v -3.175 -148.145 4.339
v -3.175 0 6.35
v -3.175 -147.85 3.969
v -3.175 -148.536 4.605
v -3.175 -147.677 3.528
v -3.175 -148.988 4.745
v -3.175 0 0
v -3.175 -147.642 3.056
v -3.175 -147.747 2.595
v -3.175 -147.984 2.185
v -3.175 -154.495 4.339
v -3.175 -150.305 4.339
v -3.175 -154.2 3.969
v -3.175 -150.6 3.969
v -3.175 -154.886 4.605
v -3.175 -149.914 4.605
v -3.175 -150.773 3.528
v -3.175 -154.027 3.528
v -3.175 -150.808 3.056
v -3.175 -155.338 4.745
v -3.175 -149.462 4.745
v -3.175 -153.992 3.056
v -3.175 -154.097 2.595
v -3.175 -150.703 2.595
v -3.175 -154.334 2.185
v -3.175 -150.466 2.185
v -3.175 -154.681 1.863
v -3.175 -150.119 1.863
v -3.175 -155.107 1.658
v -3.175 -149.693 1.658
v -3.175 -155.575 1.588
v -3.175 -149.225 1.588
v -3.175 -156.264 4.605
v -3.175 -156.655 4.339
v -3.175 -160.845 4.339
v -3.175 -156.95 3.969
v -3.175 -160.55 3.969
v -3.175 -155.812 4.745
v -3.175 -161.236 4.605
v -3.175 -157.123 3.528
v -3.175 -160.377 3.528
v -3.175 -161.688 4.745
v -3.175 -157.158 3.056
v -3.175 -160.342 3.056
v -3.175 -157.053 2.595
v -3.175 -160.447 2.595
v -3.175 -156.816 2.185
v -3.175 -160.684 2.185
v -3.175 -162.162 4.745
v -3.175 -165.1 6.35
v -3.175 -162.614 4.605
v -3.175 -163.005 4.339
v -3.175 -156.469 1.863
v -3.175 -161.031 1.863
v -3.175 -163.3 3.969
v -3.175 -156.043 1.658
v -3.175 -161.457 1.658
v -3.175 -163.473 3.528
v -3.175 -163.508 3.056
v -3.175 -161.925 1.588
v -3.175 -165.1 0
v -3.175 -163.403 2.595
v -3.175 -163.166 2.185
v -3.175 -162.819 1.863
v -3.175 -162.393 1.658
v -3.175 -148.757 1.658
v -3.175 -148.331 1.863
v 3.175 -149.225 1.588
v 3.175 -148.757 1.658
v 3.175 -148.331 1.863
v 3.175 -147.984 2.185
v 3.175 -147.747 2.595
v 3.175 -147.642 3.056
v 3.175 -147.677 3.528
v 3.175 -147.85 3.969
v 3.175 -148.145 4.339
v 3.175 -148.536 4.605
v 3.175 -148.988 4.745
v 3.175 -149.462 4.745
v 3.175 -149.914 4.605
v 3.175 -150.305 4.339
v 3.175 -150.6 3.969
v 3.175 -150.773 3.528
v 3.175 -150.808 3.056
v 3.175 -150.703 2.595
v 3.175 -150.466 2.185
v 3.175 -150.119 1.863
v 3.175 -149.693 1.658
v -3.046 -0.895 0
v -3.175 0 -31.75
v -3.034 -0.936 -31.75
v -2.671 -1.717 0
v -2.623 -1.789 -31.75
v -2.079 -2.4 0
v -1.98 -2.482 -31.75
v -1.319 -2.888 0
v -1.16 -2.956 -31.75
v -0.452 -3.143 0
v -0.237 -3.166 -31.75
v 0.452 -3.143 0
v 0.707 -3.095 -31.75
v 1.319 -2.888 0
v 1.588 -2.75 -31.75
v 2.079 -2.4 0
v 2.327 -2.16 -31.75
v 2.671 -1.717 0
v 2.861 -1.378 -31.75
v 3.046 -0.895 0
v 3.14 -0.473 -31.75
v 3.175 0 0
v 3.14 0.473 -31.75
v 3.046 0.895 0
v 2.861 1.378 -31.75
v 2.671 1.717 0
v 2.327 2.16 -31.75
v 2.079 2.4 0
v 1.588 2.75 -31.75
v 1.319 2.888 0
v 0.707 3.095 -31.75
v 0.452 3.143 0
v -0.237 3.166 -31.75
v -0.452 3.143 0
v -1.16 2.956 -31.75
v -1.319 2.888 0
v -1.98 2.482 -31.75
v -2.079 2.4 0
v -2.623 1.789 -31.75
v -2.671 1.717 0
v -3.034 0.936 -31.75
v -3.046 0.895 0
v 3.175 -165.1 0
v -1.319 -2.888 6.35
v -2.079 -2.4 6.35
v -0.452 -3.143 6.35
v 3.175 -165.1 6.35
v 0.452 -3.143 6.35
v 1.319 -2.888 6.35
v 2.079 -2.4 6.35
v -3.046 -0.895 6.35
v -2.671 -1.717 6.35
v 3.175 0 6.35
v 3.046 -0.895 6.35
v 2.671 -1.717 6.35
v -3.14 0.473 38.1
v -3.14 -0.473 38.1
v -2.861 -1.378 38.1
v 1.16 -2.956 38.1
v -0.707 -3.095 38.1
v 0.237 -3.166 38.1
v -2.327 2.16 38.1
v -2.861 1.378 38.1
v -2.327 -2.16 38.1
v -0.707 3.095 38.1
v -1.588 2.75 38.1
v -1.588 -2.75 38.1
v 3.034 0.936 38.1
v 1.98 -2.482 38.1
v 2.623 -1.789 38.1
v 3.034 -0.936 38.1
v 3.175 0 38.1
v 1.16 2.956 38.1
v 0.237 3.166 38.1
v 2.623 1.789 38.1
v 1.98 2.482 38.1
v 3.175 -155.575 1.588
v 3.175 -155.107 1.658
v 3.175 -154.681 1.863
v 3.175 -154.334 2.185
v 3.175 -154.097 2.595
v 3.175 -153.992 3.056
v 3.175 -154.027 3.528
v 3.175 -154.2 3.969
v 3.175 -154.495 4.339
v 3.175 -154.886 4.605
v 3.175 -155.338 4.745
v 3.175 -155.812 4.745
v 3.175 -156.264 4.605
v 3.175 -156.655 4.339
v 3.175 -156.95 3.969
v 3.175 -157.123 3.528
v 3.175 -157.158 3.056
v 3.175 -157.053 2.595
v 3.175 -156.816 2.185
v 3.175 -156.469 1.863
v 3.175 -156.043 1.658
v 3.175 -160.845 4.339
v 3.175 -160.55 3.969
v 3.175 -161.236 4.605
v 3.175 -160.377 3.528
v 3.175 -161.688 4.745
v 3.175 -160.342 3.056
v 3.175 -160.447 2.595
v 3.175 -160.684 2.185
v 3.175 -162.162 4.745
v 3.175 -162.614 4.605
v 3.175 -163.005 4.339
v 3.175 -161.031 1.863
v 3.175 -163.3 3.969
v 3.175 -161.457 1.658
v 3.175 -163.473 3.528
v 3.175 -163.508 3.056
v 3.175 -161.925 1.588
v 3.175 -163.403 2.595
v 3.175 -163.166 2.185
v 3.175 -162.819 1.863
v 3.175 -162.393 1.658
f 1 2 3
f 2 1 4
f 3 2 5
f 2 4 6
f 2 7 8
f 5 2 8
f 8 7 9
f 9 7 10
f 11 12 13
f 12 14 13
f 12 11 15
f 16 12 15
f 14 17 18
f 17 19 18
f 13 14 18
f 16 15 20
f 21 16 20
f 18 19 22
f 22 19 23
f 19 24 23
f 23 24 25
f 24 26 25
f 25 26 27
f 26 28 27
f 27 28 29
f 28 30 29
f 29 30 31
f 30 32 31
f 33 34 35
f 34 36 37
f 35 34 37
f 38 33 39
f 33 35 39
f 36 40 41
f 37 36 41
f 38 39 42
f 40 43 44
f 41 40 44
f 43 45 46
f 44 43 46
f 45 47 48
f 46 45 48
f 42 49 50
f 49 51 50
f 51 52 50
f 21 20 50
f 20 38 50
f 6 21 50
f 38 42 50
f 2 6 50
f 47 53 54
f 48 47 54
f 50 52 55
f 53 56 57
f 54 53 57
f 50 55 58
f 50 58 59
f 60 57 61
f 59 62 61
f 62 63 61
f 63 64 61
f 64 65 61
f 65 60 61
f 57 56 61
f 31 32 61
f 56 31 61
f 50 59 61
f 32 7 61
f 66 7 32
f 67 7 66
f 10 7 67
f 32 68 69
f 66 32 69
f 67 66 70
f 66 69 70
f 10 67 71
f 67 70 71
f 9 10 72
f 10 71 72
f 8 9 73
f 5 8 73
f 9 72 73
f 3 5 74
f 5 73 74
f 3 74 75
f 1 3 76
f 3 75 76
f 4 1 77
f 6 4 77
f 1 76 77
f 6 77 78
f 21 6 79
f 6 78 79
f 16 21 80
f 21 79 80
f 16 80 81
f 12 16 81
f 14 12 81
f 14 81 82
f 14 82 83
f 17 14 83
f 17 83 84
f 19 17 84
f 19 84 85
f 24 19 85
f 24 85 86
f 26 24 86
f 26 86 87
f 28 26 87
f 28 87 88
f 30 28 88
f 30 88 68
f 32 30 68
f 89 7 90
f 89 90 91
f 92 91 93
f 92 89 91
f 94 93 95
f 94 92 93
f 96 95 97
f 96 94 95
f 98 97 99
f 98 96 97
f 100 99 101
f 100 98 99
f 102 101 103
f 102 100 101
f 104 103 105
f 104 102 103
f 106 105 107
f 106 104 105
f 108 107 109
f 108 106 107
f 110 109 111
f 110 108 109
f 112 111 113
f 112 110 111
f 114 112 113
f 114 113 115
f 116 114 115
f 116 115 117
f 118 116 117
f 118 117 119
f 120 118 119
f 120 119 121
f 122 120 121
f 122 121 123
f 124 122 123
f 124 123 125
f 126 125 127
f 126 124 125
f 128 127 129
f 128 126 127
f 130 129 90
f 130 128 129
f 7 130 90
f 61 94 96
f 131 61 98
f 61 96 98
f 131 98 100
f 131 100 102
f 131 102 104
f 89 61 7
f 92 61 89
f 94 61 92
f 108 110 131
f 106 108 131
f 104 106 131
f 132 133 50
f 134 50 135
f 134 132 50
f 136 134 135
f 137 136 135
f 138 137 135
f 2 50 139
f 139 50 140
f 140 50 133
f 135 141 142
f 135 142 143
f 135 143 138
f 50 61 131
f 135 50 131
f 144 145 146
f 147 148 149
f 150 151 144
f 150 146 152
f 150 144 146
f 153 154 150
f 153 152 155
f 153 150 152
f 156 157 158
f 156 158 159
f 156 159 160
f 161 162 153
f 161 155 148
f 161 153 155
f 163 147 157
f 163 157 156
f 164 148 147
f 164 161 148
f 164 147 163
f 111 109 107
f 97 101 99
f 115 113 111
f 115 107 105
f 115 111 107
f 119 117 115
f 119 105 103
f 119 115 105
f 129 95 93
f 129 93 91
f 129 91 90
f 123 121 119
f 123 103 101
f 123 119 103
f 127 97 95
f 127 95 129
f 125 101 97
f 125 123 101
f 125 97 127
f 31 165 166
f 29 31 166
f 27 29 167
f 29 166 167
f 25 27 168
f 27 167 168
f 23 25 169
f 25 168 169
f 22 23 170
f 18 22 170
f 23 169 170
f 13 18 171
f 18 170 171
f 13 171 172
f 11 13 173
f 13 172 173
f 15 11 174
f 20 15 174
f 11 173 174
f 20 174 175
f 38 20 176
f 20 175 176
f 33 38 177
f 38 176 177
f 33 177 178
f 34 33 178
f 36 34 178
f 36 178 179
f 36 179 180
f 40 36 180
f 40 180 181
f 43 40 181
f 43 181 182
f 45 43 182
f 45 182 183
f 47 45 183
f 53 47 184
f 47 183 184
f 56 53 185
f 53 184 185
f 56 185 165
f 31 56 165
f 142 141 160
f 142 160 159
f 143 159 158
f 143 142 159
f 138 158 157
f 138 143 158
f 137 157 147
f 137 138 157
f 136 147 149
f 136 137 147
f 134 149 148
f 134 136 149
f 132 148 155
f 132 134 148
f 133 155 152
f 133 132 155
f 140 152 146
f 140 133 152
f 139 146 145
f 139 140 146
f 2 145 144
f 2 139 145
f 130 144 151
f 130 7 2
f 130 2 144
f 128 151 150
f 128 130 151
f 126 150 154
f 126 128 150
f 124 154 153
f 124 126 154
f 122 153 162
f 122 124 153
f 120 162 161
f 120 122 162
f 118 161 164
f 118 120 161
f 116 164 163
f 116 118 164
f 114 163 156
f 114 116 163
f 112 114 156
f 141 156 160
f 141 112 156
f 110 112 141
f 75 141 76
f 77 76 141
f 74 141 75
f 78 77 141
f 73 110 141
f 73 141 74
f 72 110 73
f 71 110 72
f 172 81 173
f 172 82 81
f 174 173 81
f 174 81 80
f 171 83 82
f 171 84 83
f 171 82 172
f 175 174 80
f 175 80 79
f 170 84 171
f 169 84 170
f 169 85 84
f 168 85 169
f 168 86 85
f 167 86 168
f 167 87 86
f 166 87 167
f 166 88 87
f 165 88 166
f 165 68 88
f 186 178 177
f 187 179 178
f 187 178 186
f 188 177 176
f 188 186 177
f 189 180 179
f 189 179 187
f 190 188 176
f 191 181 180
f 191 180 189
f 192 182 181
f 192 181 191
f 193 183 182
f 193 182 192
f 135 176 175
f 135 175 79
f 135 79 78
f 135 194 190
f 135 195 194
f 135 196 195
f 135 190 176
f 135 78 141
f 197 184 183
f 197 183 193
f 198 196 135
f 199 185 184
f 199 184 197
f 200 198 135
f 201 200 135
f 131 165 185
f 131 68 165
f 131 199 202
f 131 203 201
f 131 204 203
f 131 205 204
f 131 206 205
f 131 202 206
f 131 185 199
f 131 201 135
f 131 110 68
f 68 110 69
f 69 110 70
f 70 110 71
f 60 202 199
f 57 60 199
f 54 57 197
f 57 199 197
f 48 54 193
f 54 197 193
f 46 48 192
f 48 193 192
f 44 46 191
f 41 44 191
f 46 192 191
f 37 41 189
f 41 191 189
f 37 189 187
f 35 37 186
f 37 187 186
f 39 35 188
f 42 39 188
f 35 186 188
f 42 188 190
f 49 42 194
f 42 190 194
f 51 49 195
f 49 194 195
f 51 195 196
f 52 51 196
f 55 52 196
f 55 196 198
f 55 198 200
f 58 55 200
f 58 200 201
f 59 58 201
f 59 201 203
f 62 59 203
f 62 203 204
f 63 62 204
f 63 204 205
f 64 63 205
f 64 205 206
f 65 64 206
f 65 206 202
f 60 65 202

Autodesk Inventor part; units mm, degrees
ref_plane "YZ Plane" through (0, 0, 0) normal (1, 0, 0) x (0, 1, 0)
ref_plane "XZ Plane" through (0, 0, 0) normal (0, 1, 0) x (-1, 0, 0)
ref_plane "XY Plane" through (0, 0, 0) normal (0, 0, 1) x (1, 0, 0)
sketch "Sketch1" plane through (0, 0, 0) normal (0, 0, 1) x (1, 0, 0)
  circle A0 centre (0, 0) radius 3.175
  line L0 (-3.175, 0) -> (-3.175, -165.1)
  line L1 (3.175, 0) -> (3.175, -165.1)
  line L2 (-3.175, -165.1) -> (3.175, -165.1)
  dimension "d0" = 6.35
  dimension "d1" = 165.1
  dimension "d2" = 165.1
extrude "Extrusion1" add sketch "Sketch1" along normal blind 6.35
sketch "Sketch2" plane through (0, 0, 6.35) normal (0, 0, 1) x (1, 0, 0)
  circle A0 centre (0, 0) radius 3.175
  dimension "d5" = 6.35
extrude "Extrusion2" add sketch "Sketch2" along normal blind 31.75
sketch "Sketch3" plane through (0, 0, 0) normal (0, 0, -1) x (-1, 0, 0)
  circle A0 centre (0, 0) radius 3.175
  dimension "d8" = 6.35
extrude "Extrusion3" add sketch "Sketch3" along normal blind 31.75
sketch "Sketch5" plane through (3.175, -165.1, 0) normal (1, 0, 0) x (0, 0, -1)
  circle A0 centre (-3.175, 3.175) radius 1.5875
  circle A1 centre (-3.175, 9.525) radius 1.5875
  circle A2 centre (-3.175, 15.875) radius 1.5875
  line L0 (-6.35, 0) -> (-6.35, 165.1) projected
  line L1 (0, 0) -> (-6.35, 0) projected
  point P0 (0, 165.1)
  dimension "d11" = 3.175
  dimension "d12" = 3.175
  dimension "d13" = 3.175
  dimension "d14" = 3.175
  dimension "d15" = 3.175
  dimension "d16" = 6.35
  dimension "d17" = 6.35
extrude "Extrusion4" cut sketch "Sketch5" against normal blind 12.7
properties part number "PendulumHanger"
